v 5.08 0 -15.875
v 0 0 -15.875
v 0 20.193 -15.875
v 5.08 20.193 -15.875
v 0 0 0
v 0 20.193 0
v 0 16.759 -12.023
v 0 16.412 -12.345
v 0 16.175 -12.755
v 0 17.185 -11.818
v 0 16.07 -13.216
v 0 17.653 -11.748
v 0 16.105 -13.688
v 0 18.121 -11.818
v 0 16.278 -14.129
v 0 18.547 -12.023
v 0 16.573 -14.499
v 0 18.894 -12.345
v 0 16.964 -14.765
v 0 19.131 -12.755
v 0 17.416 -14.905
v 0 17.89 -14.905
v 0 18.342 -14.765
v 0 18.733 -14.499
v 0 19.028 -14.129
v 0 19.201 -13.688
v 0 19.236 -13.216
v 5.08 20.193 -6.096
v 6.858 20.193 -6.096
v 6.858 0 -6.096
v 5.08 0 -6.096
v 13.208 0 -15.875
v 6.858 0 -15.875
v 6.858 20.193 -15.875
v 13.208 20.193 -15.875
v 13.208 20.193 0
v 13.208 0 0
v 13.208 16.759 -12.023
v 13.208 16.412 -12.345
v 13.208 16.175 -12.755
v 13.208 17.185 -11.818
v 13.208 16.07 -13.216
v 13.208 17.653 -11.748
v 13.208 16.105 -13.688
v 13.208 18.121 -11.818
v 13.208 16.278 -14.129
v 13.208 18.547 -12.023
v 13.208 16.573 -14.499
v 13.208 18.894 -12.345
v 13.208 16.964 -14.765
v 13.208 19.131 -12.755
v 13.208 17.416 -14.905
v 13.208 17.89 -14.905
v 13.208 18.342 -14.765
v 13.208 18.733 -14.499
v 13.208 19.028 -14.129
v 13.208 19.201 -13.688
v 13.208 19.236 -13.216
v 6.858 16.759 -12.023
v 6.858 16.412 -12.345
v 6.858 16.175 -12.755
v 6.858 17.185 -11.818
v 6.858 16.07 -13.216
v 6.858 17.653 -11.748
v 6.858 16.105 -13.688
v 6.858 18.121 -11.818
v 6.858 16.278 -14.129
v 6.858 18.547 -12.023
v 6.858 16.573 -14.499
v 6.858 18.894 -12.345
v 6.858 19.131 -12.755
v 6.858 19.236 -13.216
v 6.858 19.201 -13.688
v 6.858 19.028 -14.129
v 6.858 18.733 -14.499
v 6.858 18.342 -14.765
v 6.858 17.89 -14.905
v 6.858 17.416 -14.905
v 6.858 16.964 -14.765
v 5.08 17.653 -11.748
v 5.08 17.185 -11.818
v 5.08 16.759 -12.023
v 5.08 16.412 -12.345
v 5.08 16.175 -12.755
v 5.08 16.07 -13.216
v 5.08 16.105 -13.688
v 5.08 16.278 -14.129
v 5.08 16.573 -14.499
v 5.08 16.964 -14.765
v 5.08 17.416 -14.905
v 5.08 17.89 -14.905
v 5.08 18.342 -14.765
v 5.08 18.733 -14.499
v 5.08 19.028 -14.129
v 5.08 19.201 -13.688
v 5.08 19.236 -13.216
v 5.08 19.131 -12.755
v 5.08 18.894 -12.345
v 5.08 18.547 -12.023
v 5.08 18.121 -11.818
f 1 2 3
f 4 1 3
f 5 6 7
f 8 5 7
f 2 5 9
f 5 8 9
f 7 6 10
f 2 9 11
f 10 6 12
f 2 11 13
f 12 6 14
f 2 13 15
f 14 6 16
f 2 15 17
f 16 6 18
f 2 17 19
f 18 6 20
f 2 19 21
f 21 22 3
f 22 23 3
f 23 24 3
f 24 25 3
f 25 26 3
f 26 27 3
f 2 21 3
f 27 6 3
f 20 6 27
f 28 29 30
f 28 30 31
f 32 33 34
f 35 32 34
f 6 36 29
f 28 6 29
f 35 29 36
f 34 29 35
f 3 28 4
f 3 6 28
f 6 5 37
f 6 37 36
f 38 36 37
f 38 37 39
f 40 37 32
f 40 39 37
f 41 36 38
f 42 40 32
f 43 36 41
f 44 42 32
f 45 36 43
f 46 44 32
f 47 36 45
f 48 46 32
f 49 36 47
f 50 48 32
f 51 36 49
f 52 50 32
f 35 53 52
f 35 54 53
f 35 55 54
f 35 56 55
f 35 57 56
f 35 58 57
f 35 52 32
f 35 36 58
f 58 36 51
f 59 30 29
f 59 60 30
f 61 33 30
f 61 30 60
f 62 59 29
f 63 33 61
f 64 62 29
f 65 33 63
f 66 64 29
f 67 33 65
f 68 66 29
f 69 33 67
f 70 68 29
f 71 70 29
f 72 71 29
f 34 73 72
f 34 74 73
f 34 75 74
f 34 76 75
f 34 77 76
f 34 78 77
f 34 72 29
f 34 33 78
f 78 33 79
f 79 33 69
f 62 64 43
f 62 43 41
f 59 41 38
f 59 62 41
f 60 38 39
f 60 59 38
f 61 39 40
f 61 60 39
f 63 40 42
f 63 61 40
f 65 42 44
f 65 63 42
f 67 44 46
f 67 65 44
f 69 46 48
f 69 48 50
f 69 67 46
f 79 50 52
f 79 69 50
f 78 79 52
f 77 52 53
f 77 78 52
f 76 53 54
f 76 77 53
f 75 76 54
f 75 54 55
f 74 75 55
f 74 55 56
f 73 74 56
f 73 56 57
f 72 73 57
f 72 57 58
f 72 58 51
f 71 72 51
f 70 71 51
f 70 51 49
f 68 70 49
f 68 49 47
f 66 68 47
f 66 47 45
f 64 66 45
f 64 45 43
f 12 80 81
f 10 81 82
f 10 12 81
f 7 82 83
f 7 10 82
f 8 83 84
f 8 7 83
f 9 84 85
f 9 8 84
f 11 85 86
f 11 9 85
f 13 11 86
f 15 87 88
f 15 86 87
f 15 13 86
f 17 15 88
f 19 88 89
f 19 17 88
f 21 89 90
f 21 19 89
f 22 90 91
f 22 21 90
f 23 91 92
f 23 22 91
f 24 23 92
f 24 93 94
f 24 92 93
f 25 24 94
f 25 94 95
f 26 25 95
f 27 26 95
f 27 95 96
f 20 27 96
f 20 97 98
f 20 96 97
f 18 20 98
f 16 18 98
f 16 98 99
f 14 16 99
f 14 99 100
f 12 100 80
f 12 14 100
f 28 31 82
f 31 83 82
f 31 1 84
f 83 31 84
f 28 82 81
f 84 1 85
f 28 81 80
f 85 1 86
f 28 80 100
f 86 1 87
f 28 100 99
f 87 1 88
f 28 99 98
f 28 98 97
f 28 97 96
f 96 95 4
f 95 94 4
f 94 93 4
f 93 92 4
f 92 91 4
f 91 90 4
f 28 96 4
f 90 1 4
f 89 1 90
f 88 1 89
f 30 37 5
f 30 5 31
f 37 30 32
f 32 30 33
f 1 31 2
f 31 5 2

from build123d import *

# Parameters (mm, degrees)
SKETCH1_W           = 15.875
SKETCH1_H           = 20.193
SKETCH1_R           = 1.5875
BOSS_EXTRUDE1_DEPTH = 13.208
SKETCH4_W           = 1.778
SKETCH4_H           = 20.193
CUT_EXTRUDE1_DEPTH  = 9.779


with BuildPart() as part:
    # Sketch1 → Boss-Extrude1 (new body)
    with BuildSketch(Plane(origin=(0, 0, 0), x_dir=(0, 0, -1), z_dir=(1, 0, 0))):
        with Locations((7.9375, 10.0965)):
            Rectangle(SKETCH1_W, SKETCH1_H)
        with Locations(Location((13.335, 17.653, 0), (0, 0, 180))):
            Circle(SKETCH1_R, mode=Mode.SUBTRACT)
    extrude(amount=BOSS_EXTRUDE1_DEPTH)

    # Sketch4 → Cut-Extrude1 (cut)
    with BuildSketch(Plane(origin=(0, 0, -15.875), x_dir=(-1, 0, 0), z_dir=(0, 0, -1))):
        with Locations((-5.969, 10.0965)):
            Rectangle(SKETCH4_W, SKETCH4_H)
    extrude(amount=-CUT_EXTRUDE1_DEPTH, mode=Mode.SUBTRACT)


solid = part.part
